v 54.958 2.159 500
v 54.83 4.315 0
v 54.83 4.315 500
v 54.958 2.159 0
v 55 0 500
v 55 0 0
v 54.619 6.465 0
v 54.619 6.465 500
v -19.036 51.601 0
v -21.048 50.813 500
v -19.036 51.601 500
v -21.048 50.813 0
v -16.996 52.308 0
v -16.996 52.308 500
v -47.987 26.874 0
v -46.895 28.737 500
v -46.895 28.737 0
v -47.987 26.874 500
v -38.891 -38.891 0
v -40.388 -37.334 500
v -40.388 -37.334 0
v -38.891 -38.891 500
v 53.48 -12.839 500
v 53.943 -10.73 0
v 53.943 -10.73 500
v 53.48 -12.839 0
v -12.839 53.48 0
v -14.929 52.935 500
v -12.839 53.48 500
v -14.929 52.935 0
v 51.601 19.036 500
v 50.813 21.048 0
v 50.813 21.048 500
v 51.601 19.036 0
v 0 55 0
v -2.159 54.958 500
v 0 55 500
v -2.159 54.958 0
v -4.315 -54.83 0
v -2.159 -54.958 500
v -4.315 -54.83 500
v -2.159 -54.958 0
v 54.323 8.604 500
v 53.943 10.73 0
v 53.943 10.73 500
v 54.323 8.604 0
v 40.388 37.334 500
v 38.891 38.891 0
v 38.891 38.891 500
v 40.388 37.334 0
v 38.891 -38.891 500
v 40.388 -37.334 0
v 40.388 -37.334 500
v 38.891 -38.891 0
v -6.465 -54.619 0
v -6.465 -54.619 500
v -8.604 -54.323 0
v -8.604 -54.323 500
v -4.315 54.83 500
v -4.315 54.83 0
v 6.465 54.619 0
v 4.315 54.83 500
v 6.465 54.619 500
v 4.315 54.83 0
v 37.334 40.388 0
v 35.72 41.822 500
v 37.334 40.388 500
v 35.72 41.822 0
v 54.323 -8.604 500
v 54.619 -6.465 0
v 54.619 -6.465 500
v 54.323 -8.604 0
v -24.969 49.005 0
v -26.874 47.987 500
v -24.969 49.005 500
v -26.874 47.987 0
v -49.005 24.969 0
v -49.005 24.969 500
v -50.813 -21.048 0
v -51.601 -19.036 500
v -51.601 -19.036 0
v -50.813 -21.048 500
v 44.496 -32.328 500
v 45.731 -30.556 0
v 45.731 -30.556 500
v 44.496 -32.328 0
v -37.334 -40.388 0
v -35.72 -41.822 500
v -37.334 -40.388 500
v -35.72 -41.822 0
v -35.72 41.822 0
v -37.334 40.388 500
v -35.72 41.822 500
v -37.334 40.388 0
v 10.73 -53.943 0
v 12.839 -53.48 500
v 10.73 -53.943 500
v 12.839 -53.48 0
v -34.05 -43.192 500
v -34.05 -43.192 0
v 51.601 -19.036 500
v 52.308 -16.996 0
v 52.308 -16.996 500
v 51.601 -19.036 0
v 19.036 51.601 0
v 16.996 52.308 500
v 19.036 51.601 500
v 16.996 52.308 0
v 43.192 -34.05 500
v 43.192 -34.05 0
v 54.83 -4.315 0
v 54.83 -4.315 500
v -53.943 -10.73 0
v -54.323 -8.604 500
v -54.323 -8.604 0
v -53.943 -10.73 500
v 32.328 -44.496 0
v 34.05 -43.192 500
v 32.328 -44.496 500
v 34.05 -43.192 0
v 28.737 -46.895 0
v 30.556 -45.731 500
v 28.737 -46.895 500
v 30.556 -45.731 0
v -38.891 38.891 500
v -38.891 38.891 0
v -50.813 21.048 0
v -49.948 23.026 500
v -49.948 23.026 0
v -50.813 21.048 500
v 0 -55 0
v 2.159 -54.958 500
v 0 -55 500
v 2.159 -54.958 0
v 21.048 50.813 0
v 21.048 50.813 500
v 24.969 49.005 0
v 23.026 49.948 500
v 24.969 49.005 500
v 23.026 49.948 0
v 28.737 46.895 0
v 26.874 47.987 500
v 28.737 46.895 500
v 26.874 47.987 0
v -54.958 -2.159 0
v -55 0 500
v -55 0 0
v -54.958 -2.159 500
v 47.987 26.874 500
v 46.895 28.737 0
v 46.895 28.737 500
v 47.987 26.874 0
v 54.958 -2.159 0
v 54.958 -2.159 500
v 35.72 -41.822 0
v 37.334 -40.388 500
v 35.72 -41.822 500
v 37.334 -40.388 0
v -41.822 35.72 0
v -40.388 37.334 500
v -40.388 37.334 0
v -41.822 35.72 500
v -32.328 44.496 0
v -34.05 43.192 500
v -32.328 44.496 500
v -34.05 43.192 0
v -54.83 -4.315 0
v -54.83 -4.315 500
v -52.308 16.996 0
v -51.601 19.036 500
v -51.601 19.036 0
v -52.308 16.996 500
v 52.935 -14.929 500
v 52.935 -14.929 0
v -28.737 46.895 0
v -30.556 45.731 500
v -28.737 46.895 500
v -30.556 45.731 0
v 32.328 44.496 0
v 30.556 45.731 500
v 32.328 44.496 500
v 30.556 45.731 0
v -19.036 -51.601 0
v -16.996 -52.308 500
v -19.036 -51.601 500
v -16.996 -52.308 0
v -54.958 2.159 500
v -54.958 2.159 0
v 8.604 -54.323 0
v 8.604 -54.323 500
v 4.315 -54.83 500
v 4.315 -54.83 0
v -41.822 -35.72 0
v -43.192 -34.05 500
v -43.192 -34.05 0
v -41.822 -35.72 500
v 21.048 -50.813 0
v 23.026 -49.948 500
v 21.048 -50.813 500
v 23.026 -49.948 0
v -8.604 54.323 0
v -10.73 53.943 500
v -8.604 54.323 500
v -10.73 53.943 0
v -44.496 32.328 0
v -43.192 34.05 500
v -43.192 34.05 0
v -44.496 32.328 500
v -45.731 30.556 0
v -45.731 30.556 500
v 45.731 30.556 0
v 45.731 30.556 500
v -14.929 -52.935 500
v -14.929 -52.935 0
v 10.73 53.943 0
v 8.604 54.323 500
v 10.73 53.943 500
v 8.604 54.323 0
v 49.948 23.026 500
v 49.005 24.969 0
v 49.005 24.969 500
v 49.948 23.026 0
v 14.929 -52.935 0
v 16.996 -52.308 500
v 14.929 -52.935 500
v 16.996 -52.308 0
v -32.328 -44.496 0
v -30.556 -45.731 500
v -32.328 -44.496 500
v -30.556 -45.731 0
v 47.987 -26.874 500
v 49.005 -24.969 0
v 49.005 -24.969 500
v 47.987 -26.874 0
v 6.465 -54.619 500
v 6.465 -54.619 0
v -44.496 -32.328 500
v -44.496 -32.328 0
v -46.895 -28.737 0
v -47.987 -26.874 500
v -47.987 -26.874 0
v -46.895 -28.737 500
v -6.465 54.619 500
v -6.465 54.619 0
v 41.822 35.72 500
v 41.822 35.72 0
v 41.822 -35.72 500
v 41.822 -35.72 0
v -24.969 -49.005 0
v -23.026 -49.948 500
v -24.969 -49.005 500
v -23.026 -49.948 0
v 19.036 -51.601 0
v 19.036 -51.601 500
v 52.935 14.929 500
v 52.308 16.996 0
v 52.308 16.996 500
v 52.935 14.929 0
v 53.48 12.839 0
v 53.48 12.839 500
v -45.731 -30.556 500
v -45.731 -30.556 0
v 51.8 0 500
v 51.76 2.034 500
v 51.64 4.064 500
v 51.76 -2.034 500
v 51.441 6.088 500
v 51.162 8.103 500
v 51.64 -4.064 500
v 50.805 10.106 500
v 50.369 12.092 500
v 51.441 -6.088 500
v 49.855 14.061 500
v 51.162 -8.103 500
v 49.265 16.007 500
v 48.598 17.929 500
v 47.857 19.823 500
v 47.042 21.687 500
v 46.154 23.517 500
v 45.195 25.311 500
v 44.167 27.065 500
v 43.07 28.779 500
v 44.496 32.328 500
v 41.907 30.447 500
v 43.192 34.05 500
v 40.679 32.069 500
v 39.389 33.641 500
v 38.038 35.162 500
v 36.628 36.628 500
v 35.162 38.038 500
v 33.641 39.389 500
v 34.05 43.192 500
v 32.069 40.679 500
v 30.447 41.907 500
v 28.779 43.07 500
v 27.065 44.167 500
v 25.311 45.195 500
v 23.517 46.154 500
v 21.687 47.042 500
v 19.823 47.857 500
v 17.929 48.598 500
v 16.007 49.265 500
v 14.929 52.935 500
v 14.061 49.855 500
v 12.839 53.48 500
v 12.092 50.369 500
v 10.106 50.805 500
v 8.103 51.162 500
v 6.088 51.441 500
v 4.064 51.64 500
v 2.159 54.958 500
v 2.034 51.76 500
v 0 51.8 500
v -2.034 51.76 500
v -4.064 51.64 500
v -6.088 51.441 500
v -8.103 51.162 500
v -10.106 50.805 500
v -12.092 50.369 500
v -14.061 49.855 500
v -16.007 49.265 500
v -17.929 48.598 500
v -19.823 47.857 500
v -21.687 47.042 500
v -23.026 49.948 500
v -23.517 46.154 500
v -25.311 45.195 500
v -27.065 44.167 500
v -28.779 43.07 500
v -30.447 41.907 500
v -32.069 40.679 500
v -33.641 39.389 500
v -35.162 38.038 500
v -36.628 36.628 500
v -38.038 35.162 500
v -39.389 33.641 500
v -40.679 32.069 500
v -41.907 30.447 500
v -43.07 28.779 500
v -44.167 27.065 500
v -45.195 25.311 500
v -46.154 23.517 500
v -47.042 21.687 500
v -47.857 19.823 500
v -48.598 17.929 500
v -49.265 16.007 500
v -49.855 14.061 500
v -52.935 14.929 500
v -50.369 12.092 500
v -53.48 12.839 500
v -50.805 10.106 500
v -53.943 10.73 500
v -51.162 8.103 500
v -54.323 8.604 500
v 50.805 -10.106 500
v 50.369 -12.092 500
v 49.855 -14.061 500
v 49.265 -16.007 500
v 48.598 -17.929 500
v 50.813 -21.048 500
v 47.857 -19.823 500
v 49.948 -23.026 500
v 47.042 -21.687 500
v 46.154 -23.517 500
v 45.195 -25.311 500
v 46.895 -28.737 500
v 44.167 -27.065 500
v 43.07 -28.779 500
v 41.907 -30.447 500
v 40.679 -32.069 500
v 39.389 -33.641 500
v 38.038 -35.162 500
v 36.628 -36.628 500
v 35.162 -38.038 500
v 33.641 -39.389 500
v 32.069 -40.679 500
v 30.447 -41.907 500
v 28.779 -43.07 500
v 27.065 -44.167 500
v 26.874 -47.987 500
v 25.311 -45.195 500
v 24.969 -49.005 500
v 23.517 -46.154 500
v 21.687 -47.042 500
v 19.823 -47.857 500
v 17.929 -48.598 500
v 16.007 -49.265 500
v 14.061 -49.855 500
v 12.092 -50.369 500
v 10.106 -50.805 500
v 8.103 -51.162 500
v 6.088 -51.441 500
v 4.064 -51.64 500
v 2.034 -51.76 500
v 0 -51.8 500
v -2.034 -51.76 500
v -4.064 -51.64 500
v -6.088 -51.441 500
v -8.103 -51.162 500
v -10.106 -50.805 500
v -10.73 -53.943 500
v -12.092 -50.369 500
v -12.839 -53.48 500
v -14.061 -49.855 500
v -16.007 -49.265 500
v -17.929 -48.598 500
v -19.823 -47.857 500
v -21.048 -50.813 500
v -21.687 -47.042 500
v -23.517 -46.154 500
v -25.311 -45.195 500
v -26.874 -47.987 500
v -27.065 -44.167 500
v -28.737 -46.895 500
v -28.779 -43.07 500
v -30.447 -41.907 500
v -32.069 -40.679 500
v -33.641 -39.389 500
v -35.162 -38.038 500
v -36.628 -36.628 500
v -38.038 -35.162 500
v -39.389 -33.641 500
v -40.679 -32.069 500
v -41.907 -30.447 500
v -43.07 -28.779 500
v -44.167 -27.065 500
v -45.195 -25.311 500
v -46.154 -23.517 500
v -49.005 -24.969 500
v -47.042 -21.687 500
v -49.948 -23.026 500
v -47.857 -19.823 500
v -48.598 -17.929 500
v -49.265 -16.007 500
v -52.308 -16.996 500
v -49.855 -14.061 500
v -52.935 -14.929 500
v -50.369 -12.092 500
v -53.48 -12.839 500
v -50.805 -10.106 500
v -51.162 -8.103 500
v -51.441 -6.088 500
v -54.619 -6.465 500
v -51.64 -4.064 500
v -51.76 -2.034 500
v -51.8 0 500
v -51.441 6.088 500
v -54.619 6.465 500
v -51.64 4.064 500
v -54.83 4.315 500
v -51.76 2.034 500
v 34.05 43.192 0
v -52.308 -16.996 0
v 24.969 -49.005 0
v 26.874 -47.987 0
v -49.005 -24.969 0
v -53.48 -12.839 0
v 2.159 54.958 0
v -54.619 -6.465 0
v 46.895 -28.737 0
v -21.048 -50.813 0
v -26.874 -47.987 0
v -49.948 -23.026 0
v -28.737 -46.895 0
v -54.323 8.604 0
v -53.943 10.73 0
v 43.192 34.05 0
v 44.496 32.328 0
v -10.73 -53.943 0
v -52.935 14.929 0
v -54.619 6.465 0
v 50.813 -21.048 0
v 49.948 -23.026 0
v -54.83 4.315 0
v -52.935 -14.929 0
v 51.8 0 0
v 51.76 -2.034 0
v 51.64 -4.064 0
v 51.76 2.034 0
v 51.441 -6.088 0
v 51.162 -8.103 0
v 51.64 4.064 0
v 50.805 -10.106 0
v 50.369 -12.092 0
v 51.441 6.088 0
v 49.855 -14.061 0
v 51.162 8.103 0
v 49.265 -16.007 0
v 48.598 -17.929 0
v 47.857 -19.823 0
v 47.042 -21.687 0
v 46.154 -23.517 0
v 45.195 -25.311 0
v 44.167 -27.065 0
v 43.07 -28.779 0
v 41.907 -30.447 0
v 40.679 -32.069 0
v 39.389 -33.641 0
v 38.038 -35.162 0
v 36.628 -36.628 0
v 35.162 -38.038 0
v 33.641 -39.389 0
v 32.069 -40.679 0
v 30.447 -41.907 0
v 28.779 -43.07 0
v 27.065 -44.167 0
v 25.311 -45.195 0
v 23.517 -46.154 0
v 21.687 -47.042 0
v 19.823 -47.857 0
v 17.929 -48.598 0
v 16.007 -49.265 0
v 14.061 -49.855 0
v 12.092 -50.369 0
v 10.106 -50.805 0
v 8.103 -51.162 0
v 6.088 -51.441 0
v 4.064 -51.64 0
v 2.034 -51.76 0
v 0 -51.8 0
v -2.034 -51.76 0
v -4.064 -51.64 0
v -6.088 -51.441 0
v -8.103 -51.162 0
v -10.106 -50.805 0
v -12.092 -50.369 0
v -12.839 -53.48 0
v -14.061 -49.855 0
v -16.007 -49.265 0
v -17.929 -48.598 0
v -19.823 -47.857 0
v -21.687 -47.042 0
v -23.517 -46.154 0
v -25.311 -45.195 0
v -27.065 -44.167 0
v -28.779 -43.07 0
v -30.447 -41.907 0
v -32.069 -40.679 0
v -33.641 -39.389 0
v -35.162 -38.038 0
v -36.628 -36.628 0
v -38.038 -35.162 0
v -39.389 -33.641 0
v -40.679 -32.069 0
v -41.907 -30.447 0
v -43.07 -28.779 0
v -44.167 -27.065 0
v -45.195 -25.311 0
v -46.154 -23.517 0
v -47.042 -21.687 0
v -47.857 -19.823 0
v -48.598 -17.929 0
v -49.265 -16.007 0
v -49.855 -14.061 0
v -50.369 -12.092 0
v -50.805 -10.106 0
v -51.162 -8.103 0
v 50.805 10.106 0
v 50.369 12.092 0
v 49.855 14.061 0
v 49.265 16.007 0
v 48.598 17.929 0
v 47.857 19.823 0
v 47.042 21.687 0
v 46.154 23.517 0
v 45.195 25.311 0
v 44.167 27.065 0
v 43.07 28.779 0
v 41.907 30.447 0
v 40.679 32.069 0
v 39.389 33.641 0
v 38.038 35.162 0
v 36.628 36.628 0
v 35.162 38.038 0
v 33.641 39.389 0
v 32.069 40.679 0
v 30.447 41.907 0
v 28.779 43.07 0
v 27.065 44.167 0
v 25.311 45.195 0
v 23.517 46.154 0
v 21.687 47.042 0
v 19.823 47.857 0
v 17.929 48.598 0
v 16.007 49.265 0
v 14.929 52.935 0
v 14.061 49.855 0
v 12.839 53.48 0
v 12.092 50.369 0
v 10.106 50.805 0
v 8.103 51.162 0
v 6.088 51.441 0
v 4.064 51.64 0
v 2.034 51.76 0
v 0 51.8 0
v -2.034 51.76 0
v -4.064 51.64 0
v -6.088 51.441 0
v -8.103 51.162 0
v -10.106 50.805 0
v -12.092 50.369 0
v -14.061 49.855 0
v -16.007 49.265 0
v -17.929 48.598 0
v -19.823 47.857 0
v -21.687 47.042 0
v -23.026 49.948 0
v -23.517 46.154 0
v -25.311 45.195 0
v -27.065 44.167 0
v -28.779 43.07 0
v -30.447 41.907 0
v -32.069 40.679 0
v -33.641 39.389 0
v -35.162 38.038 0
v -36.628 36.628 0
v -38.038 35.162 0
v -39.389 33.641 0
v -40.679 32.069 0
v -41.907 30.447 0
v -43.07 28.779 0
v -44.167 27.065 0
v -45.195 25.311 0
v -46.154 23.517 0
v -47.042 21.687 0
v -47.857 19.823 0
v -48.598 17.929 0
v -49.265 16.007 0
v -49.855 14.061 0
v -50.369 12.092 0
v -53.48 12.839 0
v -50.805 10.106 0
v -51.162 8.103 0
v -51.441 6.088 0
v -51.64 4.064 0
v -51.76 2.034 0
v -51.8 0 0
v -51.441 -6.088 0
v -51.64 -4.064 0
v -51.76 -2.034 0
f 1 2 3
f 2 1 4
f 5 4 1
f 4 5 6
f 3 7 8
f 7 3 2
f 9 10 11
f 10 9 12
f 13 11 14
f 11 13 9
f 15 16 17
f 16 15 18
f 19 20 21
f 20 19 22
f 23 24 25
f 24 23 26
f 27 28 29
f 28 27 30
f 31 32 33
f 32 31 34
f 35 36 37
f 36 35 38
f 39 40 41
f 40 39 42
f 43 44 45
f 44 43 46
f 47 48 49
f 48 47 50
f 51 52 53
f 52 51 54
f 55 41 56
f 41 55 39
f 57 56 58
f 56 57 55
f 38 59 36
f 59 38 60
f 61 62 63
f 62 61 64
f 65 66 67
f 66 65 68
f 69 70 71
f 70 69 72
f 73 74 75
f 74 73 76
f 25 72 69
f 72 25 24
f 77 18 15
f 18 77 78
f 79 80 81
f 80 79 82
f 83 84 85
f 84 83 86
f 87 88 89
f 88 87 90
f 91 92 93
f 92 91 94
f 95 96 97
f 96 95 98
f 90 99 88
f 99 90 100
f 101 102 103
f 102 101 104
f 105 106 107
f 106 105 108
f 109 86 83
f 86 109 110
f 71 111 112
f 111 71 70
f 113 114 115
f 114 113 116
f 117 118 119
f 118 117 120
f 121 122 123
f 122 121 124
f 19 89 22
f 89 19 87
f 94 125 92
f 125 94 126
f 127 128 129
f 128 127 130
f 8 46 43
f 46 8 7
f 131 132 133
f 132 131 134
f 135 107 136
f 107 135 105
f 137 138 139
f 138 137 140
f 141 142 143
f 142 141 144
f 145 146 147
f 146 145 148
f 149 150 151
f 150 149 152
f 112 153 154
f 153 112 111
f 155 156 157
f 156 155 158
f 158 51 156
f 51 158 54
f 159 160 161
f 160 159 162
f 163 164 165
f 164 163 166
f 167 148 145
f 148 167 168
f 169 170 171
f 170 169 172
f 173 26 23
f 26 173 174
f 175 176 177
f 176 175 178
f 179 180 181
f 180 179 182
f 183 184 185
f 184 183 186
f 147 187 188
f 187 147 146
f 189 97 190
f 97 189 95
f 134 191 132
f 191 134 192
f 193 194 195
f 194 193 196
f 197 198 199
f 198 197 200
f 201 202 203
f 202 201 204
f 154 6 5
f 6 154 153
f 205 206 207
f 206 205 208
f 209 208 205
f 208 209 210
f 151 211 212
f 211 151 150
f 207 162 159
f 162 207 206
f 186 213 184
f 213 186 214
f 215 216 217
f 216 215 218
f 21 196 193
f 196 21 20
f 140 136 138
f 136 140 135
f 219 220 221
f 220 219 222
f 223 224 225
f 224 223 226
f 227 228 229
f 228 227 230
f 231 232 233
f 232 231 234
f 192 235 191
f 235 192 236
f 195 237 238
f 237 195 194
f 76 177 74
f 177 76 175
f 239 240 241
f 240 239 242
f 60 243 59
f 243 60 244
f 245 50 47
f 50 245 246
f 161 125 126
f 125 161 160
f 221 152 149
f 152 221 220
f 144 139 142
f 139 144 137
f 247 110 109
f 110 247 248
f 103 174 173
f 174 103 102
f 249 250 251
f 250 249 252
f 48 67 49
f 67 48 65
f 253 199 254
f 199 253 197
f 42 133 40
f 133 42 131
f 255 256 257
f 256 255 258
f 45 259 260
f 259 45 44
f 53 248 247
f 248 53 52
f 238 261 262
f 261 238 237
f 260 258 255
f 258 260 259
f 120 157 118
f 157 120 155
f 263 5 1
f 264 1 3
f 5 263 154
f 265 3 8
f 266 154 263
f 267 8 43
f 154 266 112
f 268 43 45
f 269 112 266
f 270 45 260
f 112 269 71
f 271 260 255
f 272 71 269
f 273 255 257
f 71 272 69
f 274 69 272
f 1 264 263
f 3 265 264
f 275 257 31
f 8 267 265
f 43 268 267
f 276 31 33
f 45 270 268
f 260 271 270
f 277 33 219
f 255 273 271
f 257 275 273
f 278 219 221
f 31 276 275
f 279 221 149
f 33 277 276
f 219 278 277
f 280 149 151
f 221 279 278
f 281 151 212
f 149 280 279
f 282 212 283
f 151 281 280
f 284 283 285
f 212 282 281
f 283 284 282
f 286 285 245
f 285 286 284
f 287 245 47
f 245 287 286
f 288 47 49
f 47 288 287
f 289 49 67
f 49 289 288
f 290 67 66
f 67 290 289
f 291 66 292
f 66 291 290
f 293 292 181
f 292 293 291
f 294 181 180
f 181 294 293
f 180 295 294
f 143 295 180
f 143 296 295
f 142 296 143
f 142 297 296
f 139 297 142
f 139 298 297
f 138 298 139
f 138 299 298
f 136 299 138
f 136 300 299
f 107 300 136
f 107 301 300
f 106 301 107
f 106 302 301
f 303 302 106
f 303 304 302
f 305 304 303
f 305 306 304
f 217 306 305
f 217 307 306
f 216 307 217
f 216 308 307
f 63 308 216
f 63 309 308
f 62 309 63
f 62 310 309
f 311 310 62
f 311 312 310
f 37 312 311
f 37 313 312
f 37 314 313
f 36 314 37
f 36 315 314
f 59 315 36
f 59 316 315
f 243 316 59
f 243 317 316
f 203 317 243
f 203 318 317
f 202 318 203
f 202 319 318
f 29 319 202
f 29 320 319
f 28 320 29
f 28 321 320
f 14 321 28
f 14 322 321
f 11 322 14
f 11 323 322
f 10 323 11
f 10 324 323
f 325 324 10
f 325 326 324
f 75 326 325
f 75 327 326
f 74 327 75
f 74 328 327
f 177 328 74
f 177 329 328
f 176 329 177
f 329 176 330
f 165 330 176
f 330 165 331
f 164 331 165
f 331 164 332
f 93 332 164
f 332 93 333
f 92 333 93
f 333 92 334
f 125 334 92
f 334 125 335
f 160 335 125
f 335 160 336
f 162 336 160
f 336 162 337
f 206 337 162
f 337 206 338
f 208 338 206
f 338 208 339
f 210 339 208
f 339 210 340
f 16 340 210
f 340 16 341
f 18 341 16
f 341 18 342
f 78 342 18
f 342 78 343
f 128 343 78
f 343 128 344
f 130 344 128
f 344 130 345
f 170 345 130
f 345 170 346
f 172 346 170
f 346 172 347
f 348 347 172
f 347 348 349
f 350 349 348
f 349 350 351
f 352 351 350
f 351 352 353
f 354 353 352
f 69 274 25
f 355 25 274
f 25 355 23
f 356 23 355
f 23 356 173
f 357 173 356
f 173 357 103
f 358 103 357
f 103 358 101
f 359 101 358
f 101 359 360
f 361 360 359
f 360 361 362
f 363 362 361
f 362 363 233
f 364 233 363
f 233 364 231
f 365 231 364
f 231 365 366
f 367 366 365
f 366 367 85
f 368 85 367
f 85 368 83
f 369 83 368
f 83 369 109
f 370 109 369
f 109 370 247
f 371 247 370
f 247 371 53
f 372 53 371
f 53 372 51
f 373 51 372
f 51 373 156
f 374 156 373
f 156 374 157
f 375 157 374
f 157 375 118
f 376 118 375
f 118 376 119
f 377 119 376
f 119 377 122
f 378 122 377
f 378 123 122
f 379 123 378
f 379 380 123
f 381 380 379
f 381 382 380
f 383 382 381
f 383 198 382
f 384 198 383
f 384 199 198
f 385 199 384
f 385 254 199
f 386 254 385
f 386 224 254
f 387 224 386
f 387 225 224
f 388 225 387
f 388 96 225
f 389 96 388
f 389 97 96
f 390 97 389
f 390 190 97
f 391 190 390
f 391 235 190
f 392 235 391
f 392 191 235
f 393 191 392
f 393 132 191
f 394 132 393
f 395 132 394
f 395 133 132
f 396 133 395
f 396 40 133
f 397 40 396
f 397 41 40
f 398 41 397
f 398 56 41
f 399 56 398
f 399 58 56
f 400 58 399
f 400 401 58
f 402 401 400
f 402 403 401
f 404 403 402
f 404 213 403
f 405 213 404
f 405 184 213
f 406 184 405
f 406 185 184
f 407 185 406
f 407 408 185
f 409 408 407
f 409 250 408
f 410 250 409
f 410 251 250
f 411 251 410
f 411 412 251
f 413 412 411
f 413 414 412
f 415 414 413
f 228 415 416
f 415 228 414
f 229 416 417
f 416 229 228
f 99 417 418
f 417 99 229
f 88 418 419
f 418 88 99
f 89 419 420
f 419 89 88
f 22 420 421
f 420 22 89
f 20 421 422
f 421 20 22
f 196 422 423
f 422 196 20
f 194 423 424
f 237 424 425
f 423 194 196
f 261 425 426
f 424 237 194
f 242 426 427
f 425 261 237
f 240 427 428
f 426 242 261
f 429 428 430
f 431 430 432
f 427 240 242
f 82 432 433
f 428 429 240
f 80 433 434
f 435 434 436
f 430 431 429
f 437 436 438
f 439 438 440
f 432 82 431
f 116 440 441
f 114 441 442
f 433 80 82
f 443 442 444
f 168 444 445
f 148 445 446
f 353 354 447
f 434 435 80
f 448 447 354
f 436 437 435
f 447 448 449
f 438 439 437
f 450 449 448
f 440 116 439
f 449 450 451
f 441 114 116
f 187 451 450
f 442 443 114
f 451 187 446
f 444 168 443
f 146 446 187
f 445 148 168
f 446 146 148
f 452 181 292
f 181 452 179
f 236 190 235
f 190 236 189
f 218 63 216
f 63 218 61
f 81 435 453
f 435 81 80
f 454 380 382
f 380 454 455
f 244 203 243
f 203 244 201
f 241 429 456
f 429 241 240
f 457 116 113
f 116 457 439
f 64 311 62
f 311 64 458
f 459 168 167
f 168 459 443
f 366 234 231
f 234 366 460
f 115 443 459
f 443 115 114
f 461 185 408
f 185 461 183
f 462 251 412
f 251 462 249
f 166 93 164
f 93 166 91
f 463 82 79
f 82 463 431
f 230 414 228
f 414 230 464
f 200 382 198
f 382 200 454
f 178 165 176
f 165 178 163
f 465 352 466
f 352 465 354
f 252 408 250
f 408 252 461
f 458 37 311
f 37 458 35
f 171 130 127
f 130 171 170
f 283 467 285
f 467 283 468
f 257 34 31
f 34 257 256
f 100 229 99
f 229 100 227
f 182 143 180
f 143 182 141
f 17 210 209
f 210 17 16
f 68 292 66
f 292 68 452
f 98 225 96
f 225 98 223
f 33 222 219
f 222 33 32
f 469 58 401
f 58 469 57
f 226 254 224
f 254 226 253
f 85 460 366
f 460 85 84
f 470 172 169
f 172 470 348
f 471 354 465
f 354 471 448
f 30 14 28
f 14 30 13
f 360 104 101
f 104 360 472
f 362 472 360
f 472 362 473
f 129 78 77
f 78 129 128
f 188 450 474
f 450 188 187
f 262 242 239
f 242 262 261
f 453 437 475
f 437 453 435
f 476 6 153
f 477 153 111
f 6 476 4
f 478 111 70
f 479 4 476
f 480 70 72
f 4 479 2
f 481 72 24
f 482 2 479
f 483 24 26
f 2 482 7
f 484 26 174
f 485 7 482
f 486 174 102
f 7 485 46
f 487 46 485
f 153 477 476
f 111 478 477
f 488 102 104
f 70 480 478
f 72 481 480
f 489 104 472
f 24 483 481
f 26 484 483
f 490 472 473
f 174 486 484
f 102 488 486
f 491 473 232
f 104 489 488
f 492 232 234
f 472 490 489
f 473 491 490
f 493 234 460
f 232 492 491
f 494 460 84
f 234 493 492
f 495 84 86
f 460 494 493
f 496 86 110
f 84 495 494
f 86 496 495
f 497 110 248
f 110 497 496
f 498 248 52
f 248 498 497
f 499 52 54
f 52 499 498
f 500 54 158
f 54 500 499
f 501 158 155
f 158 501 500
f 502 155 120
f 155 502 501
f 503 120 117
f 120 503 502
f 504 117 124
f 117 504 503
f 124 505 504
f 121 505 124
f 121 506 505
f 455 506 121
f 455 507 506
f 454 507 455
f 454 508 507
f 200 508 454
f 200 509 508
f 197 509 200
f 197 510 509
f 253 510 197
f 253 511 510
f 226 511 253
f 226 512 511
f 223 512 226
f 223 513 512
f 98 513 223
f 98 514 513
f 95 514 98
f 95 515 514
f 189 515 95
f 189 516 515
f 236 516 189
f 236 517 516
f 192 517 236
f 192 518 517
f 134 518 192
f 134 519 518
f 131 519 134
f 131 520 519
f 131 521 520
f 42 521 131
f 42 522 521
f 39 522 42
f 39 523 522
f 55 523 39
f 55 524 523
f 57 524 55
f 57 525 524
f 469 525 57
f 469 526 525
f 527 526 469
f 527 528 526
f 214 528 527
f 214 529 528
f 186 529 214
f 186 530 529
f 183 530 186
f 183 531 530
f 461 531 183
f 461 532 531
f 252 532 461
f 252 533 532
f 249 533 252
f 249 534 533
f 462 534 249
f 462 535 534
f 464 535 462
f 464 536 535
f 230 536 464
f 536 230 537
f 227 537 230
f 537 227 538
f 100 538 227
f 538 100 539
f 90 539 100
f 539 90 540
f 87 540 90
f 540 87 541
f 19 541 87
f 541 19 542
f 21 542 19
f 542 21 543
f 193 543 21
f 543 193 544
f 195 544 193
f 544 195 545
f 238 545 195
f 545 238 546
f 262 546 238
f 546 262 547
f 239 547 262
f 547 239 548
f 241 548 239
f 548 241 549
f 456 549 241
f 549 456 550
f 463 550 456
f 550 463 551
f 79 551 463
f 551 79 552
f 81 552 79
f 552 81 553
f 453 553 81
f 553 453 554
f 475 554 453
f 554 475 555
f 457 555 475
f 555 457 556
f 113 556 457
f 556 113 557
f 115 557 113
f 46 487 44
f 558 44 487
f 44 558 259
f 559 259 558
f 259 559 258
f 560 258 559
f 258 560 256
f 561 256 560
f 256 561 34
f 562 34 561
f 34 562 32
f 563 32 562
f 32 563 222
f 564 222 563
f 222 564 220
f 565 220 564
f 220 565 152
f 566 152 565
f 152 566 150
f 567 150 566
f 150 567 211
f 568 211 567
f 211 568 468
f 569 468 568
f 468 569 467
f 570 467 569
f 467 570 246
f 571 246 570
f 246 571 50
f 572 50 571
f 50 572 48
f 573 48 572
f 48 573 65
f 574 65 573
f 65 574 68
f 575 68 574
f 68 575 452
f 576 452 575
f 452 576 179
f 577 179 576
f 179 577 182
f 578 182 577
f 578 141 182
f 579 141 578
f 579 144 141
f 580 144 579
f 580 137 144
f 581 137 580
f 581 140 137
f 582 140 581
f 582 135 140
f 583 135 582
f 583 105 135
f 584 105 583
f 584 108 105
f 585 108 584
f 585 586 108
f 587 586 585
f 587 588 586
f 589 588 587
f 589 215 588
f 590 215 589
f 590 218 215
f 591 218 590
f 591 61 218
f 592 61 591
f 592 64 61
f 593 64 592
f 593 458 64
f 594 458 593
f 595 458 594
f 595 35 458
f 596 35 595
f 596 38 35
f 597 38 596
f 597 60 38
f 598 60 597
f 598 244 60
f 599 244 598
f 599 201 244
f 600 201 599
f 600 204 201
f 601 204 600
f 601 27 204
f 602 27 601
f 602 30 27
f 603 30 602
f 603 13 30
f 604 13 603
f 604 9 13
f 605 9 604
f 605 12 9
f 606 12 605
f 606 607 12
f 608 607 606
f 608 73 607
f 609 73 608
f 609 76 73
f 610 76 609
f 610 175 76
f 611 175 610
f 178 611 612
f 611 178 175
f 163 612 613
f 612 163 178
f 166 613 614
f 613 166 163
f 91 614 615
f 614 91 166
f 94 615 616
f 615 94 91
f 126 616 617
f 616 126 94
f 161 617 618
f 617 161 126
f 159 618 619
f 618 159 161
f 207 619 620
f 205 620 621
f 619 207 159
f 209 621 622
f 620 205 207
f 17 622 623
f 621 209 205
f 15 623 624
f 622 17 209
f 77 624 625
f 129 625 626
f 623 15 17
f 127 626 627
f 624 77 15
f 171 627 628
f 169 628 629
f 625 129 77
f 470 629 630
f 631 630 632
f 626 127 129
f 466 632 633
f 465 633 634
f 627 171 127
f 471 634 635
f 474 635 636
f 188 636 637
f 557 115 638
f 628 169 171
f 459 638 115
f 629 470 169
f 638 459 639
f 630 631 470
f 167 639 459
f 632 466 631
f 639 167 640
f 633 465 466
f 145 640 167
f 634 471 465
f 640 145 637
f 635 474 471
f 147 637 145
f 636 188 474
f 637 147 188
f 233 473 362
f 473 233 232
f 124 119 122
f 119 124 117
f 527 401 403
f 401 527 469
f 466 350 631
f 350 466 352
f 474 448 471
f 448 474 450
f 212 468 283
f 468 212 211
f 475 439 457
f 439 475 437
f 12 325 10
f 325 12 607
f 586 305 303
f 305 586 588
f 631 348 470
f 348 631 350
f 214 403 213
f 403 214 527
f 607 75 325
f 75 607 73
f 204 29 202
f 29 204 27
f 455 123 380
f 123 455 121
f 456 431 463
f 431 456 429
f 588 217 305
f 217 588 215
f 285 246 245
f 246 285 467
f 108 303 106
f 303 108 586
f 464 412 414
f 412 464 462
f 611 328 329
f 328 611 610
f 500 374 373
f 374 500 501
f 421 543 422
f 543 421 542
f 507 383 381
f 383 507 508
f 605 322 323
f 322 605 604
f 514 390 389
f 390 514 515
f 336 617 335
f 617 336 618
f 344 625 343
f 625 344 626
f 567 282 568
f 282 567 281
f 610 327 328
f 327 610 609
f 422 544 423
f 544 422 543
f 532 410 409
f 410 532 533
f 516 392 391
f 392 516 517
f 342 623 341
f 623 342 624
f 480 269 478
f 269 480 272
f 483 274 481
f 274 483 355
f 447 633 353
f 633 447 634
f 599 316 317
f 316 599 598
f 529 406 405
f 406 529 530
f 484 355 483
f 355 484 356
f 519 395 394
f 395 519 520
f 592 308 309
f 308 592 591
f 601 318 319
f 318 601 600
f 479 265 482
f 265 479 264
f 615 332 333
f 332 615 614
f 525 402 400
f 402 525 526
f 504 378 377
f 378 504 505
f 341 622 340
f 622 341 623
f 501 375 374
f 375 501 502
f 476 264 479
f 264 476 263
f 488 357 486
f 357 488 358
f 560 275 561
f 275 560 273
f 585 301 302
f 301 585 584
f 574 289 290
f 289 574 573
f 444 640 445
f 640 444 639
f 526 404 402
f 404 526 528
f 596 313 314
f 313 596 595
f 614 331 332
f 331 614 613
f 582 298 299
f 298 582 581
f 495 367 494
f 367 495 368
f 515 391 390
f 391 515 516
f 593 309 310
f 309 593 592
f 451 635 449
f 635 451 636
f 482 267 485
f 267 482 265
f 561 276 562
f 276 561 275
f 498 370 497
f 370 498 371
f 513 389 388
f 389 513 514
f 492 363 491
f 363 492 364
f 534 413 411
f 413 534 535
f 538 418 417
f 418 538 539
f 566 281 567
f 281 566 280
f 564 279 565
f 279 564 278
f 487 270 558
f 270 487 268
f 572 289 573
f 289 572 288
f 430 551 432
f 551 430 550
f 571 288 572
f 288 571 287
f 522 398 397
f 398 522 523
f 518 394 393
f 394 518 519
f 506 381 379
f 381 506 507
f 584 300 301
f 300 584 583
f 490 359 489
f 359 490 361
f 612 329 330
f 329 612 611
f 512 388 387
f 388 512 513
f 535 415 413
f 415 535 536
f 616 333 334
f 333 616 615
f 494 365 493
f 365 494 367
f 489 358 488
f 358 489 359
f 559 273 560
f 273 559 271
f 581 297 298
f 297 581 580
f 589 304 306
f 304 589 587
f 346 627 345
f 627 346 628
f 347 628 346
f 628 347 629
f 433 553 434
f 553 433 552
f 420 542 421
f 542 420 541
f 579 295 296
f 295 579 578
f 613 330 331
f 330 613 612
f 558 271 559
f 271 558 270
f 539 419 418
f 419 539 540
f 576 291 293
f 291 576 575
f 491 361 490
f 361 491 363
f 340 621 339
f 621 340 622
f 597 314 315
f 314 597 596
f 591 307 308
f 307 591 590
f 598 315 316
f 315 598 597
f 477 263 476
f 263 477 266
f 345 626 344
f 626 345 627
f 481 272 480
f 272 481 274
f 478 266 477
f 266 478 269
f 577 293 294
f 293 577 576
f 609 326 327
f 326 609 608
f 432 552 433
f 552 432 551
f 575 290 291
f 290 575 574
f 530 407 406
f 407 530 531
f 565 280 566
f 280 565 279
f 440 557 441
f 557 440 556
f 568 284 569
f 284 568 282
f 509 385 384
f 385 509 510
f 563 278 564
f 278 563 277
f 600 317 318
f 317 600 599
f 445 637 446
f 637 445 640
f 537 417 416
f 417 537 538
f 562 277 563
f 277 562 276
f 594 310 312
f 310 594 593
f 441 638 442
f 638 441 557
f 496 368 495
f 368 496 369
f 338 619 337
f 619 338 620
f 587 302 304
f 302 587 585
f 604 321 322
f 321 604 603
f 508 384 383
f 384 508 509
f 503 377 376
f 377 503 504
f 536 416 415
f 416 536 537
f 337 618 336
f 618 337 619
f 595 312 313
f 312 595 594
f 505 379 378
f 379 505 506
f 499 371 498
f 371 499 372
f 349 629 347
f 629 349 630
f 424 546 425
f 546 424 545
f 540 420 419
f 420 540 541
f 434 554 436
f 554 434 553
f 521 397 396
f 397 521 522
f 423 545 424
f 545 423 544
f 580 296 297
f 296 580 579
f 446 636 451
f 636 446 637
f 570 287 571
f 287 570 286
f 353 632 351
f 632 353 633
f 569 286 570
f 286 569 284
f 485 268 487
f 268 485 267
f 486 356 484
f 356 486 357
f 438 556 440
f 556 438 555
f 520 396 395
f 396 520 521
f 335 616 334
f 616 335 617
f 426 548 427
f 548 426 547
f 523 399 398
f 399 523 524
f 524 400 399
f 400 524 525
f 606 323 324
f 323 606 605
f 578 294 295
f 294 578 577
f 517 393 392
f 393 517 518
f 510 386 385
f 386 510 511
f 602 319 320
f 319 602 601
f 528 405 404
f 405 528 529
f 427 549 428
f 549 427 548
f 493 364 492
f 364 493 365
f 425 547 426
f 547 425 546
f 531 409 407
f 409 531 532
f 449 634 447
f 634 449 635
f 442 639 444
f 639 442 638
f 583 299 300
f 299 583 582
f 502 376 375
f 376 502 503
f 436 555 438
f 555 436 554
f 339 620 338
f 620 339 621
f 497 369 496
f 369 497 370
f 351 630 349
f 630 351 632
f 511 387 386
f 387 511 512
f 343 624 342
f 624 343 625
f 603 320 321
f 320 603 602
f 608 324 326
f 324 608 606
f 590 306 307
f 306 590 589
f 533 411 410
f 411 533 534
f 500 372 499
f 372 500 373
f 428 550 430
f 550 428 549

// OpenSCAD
// HT 110 pipe 500 mm (hollow) - robust, visible geometry

outer_diameter = 110;     // mm
wall_thickness = 3.2;     // mm
length = 500;             // mm
$fn = 160;

module ht_pipe_segment(od, wt, len) {
    id = od - 2*wt;
    eps = 0.2; // overlap to avoid coplanar faces / rendering artifacts

    // Use non-centered cylinders with explicit Z placement for reliable preview/render
    difference() {
        cylinder(h=len, d=od, center=false);
        translate([0, 0, -eps])
            cylinder(h=len + 2*eps, d=id, center=false);
    }
}

ht_pipe_segment(outer_diameter, wall_thickness, length);
